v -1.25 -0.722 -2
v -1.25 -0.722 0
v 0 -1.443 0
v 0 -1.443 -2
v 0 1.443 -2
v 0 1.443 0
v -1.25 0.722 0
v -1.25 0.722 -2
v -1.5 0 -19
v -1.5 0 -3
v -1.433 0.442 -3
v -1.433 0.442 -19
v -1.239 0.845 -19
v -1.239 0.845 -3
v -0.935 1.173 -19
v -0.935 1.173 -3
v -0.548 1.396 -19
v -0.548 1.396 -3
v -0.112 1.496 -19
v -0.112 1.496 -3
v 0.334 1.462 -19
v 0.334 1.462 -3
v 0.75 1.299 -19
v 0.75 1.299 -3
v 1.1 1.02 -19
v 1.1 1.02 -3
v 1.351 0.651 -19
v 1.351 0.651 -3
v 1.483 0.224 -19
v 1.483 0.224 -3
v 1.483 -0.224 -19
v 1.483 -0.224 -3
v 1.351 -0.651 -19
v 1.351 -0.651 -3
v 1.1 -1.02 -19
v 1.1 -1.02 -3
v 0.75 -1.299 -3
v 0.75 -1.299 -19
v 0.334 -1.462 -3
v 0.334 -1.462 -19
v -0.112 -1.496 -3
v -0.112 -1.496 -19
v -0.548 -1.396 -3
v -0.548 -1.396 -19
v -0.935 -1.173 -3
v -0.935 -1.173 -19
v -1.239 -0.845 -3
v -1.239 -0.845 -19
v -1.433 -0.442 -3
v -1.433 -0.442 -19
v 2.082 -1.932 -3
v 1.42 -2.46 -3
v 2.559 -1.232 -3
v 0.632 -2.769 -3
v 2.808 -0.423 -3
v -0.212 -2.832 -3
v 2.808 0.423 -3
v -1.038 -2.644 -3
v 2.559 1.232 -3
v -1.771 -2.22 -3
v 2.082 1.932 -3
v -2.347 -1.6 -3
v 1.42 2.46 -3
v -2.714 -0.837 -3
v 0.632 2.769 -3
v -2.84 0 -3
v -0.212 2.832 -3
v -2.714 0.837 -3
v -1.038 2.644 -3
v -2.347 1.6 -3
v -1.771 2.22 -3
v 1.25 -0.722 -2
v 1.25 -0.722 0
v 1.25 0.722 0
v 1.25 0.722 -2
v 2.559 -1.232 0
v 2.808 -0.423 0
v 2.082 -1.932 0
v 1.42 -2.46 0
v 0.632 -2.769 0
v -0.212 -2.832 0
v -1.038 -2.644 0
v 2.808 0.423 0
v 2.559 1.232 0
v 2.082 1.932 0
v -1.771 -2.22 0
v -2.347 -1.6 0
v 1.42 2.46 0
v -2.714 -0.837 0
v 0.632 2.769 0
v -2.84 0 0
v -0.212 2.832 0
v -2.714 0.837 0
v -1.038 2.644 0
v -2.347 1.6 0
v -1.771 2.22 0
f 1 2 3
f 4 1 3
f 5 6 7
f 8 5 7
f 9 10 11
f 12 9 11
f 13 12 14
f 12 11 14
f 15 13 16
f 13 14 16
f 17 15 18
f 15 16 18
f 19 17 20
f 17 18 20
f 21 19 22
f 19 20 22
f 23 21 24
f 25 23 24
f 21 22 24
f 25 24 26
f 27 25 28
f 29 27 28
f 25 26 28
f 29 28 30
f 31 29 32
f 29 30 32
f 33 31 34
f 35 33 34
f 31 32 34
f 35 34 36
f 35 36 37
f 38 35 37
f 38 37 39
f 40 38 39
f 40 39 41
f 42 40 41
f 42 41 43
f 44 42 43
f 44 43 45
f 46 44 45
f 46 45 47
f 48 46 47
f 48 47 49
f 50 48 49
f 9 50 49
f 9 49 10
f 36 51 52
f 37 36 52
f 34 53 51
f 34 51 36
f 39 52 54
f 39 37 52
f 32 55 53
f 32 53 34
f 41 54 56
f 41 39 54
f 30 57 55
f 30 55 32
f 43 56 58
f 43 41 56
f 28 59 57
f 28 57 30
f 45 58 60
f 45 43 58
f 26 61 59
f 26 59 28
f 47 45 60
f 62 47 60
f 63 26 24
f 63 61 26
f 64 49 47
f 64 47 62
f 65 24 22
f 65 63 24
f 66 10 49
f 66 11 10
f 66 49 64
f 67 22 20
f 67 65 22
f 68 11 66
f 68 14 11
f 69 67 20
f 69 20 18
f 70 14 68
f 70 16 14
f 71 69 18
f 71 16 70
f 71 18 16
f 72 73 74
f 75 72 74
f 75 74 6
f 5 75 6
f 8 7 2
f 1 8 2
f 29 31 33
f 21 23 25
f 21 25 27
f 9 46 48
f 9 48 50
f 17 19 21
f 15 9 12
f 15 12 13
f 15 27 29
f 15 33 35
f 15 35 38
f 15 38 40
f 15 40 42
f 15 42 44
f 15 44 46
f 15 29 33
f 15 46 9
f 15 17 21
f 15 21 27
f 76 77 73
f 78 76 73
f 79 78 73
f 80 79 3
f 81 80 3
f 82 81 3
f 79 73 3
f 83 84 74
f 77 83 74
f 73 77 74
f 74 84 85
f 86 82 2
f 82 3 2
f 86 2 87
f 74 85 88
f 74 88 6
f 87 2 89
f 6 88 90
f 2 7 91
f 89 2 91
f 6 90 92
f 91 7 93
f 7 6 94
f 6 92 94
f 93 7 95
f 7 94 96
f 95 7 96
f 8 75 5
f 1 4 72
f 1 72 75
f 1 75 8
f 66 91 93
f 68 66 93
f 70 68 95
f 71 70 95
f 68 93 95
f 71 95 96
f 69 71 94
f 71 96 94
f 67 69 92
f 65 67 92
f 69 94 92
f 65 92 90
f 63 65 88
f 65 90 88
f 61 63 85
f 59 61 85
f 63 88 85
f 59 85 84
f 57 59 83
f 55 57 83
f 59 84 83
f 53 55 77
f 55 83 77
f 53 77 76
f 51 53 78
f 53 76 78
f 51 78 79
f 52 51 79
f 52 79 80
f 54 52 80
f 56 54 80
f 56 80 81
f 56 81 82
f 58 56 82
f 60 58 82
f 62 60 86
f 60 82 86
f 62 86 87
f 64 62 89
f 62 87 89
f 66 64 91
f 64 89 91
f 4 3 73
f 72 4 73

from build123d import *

# Parameters (mm, degrees)
CYLINDER026_R                      = 1.5
CYLINDER026_DEPTH                  = 19
CYLINDER025_R                      = 2.84
CYLINDER025_DEPTH                  = 3
FUSION001018017023_PLACEMENT_ANGLE = 180
POCKET002018004005005017_DEPTH     = 2


with BuildPart() as cylinder026:
    # Cylinder026 → Cylinder026 (new body)
    with BuildSketch(Plane.XY):
        Circle(CYLINDER026_R)
    extrude(amount=CYLINDER026_DEPTH)


with BuildPart() as zylinderkopfschraube_m3x16_din912:
    # Cylinder025 → Cylinder025 (new body)
    with BuildSketch(Plane.XY):
        Circle(CYLINDER025_R)
    extrude(amount=CYLINDER025_DEPTH)

    # Fusion001018017023: union Cylinder026
    add(cylinder026.part)


with BuildPart() as zylinderkopfschraube_m3x16_din912_1:
    # Fusion001018017023 placement: moved
    add(zylinderkopfschraube_m3x16_din912.part.rotate(Axis((0, 0, 0), (0, 1, 0)), FUSION001018017023_PLACEMENT_ANGLE))

    # Sketch025 → Pocket002018004005005017 (cut)
    with BuildSketch(Plane(origin=(0, 0, 0), x_dir=(-1, 0, 0), z_dir=(0, 0, 1))):
        Polygon((1.25, -0.721688), (1.25, 0.721688), (0, 1.443376), (-1.25, 0.721688), (-1.25, -0.721688), (0, -1.443376), align=None)
    extrude(amount=-POCKET002018004005005017_DEPTH, mode=Mode.SUBTRACT)


solid = zylinderkopfschraube_m3x16_din912_1.part
